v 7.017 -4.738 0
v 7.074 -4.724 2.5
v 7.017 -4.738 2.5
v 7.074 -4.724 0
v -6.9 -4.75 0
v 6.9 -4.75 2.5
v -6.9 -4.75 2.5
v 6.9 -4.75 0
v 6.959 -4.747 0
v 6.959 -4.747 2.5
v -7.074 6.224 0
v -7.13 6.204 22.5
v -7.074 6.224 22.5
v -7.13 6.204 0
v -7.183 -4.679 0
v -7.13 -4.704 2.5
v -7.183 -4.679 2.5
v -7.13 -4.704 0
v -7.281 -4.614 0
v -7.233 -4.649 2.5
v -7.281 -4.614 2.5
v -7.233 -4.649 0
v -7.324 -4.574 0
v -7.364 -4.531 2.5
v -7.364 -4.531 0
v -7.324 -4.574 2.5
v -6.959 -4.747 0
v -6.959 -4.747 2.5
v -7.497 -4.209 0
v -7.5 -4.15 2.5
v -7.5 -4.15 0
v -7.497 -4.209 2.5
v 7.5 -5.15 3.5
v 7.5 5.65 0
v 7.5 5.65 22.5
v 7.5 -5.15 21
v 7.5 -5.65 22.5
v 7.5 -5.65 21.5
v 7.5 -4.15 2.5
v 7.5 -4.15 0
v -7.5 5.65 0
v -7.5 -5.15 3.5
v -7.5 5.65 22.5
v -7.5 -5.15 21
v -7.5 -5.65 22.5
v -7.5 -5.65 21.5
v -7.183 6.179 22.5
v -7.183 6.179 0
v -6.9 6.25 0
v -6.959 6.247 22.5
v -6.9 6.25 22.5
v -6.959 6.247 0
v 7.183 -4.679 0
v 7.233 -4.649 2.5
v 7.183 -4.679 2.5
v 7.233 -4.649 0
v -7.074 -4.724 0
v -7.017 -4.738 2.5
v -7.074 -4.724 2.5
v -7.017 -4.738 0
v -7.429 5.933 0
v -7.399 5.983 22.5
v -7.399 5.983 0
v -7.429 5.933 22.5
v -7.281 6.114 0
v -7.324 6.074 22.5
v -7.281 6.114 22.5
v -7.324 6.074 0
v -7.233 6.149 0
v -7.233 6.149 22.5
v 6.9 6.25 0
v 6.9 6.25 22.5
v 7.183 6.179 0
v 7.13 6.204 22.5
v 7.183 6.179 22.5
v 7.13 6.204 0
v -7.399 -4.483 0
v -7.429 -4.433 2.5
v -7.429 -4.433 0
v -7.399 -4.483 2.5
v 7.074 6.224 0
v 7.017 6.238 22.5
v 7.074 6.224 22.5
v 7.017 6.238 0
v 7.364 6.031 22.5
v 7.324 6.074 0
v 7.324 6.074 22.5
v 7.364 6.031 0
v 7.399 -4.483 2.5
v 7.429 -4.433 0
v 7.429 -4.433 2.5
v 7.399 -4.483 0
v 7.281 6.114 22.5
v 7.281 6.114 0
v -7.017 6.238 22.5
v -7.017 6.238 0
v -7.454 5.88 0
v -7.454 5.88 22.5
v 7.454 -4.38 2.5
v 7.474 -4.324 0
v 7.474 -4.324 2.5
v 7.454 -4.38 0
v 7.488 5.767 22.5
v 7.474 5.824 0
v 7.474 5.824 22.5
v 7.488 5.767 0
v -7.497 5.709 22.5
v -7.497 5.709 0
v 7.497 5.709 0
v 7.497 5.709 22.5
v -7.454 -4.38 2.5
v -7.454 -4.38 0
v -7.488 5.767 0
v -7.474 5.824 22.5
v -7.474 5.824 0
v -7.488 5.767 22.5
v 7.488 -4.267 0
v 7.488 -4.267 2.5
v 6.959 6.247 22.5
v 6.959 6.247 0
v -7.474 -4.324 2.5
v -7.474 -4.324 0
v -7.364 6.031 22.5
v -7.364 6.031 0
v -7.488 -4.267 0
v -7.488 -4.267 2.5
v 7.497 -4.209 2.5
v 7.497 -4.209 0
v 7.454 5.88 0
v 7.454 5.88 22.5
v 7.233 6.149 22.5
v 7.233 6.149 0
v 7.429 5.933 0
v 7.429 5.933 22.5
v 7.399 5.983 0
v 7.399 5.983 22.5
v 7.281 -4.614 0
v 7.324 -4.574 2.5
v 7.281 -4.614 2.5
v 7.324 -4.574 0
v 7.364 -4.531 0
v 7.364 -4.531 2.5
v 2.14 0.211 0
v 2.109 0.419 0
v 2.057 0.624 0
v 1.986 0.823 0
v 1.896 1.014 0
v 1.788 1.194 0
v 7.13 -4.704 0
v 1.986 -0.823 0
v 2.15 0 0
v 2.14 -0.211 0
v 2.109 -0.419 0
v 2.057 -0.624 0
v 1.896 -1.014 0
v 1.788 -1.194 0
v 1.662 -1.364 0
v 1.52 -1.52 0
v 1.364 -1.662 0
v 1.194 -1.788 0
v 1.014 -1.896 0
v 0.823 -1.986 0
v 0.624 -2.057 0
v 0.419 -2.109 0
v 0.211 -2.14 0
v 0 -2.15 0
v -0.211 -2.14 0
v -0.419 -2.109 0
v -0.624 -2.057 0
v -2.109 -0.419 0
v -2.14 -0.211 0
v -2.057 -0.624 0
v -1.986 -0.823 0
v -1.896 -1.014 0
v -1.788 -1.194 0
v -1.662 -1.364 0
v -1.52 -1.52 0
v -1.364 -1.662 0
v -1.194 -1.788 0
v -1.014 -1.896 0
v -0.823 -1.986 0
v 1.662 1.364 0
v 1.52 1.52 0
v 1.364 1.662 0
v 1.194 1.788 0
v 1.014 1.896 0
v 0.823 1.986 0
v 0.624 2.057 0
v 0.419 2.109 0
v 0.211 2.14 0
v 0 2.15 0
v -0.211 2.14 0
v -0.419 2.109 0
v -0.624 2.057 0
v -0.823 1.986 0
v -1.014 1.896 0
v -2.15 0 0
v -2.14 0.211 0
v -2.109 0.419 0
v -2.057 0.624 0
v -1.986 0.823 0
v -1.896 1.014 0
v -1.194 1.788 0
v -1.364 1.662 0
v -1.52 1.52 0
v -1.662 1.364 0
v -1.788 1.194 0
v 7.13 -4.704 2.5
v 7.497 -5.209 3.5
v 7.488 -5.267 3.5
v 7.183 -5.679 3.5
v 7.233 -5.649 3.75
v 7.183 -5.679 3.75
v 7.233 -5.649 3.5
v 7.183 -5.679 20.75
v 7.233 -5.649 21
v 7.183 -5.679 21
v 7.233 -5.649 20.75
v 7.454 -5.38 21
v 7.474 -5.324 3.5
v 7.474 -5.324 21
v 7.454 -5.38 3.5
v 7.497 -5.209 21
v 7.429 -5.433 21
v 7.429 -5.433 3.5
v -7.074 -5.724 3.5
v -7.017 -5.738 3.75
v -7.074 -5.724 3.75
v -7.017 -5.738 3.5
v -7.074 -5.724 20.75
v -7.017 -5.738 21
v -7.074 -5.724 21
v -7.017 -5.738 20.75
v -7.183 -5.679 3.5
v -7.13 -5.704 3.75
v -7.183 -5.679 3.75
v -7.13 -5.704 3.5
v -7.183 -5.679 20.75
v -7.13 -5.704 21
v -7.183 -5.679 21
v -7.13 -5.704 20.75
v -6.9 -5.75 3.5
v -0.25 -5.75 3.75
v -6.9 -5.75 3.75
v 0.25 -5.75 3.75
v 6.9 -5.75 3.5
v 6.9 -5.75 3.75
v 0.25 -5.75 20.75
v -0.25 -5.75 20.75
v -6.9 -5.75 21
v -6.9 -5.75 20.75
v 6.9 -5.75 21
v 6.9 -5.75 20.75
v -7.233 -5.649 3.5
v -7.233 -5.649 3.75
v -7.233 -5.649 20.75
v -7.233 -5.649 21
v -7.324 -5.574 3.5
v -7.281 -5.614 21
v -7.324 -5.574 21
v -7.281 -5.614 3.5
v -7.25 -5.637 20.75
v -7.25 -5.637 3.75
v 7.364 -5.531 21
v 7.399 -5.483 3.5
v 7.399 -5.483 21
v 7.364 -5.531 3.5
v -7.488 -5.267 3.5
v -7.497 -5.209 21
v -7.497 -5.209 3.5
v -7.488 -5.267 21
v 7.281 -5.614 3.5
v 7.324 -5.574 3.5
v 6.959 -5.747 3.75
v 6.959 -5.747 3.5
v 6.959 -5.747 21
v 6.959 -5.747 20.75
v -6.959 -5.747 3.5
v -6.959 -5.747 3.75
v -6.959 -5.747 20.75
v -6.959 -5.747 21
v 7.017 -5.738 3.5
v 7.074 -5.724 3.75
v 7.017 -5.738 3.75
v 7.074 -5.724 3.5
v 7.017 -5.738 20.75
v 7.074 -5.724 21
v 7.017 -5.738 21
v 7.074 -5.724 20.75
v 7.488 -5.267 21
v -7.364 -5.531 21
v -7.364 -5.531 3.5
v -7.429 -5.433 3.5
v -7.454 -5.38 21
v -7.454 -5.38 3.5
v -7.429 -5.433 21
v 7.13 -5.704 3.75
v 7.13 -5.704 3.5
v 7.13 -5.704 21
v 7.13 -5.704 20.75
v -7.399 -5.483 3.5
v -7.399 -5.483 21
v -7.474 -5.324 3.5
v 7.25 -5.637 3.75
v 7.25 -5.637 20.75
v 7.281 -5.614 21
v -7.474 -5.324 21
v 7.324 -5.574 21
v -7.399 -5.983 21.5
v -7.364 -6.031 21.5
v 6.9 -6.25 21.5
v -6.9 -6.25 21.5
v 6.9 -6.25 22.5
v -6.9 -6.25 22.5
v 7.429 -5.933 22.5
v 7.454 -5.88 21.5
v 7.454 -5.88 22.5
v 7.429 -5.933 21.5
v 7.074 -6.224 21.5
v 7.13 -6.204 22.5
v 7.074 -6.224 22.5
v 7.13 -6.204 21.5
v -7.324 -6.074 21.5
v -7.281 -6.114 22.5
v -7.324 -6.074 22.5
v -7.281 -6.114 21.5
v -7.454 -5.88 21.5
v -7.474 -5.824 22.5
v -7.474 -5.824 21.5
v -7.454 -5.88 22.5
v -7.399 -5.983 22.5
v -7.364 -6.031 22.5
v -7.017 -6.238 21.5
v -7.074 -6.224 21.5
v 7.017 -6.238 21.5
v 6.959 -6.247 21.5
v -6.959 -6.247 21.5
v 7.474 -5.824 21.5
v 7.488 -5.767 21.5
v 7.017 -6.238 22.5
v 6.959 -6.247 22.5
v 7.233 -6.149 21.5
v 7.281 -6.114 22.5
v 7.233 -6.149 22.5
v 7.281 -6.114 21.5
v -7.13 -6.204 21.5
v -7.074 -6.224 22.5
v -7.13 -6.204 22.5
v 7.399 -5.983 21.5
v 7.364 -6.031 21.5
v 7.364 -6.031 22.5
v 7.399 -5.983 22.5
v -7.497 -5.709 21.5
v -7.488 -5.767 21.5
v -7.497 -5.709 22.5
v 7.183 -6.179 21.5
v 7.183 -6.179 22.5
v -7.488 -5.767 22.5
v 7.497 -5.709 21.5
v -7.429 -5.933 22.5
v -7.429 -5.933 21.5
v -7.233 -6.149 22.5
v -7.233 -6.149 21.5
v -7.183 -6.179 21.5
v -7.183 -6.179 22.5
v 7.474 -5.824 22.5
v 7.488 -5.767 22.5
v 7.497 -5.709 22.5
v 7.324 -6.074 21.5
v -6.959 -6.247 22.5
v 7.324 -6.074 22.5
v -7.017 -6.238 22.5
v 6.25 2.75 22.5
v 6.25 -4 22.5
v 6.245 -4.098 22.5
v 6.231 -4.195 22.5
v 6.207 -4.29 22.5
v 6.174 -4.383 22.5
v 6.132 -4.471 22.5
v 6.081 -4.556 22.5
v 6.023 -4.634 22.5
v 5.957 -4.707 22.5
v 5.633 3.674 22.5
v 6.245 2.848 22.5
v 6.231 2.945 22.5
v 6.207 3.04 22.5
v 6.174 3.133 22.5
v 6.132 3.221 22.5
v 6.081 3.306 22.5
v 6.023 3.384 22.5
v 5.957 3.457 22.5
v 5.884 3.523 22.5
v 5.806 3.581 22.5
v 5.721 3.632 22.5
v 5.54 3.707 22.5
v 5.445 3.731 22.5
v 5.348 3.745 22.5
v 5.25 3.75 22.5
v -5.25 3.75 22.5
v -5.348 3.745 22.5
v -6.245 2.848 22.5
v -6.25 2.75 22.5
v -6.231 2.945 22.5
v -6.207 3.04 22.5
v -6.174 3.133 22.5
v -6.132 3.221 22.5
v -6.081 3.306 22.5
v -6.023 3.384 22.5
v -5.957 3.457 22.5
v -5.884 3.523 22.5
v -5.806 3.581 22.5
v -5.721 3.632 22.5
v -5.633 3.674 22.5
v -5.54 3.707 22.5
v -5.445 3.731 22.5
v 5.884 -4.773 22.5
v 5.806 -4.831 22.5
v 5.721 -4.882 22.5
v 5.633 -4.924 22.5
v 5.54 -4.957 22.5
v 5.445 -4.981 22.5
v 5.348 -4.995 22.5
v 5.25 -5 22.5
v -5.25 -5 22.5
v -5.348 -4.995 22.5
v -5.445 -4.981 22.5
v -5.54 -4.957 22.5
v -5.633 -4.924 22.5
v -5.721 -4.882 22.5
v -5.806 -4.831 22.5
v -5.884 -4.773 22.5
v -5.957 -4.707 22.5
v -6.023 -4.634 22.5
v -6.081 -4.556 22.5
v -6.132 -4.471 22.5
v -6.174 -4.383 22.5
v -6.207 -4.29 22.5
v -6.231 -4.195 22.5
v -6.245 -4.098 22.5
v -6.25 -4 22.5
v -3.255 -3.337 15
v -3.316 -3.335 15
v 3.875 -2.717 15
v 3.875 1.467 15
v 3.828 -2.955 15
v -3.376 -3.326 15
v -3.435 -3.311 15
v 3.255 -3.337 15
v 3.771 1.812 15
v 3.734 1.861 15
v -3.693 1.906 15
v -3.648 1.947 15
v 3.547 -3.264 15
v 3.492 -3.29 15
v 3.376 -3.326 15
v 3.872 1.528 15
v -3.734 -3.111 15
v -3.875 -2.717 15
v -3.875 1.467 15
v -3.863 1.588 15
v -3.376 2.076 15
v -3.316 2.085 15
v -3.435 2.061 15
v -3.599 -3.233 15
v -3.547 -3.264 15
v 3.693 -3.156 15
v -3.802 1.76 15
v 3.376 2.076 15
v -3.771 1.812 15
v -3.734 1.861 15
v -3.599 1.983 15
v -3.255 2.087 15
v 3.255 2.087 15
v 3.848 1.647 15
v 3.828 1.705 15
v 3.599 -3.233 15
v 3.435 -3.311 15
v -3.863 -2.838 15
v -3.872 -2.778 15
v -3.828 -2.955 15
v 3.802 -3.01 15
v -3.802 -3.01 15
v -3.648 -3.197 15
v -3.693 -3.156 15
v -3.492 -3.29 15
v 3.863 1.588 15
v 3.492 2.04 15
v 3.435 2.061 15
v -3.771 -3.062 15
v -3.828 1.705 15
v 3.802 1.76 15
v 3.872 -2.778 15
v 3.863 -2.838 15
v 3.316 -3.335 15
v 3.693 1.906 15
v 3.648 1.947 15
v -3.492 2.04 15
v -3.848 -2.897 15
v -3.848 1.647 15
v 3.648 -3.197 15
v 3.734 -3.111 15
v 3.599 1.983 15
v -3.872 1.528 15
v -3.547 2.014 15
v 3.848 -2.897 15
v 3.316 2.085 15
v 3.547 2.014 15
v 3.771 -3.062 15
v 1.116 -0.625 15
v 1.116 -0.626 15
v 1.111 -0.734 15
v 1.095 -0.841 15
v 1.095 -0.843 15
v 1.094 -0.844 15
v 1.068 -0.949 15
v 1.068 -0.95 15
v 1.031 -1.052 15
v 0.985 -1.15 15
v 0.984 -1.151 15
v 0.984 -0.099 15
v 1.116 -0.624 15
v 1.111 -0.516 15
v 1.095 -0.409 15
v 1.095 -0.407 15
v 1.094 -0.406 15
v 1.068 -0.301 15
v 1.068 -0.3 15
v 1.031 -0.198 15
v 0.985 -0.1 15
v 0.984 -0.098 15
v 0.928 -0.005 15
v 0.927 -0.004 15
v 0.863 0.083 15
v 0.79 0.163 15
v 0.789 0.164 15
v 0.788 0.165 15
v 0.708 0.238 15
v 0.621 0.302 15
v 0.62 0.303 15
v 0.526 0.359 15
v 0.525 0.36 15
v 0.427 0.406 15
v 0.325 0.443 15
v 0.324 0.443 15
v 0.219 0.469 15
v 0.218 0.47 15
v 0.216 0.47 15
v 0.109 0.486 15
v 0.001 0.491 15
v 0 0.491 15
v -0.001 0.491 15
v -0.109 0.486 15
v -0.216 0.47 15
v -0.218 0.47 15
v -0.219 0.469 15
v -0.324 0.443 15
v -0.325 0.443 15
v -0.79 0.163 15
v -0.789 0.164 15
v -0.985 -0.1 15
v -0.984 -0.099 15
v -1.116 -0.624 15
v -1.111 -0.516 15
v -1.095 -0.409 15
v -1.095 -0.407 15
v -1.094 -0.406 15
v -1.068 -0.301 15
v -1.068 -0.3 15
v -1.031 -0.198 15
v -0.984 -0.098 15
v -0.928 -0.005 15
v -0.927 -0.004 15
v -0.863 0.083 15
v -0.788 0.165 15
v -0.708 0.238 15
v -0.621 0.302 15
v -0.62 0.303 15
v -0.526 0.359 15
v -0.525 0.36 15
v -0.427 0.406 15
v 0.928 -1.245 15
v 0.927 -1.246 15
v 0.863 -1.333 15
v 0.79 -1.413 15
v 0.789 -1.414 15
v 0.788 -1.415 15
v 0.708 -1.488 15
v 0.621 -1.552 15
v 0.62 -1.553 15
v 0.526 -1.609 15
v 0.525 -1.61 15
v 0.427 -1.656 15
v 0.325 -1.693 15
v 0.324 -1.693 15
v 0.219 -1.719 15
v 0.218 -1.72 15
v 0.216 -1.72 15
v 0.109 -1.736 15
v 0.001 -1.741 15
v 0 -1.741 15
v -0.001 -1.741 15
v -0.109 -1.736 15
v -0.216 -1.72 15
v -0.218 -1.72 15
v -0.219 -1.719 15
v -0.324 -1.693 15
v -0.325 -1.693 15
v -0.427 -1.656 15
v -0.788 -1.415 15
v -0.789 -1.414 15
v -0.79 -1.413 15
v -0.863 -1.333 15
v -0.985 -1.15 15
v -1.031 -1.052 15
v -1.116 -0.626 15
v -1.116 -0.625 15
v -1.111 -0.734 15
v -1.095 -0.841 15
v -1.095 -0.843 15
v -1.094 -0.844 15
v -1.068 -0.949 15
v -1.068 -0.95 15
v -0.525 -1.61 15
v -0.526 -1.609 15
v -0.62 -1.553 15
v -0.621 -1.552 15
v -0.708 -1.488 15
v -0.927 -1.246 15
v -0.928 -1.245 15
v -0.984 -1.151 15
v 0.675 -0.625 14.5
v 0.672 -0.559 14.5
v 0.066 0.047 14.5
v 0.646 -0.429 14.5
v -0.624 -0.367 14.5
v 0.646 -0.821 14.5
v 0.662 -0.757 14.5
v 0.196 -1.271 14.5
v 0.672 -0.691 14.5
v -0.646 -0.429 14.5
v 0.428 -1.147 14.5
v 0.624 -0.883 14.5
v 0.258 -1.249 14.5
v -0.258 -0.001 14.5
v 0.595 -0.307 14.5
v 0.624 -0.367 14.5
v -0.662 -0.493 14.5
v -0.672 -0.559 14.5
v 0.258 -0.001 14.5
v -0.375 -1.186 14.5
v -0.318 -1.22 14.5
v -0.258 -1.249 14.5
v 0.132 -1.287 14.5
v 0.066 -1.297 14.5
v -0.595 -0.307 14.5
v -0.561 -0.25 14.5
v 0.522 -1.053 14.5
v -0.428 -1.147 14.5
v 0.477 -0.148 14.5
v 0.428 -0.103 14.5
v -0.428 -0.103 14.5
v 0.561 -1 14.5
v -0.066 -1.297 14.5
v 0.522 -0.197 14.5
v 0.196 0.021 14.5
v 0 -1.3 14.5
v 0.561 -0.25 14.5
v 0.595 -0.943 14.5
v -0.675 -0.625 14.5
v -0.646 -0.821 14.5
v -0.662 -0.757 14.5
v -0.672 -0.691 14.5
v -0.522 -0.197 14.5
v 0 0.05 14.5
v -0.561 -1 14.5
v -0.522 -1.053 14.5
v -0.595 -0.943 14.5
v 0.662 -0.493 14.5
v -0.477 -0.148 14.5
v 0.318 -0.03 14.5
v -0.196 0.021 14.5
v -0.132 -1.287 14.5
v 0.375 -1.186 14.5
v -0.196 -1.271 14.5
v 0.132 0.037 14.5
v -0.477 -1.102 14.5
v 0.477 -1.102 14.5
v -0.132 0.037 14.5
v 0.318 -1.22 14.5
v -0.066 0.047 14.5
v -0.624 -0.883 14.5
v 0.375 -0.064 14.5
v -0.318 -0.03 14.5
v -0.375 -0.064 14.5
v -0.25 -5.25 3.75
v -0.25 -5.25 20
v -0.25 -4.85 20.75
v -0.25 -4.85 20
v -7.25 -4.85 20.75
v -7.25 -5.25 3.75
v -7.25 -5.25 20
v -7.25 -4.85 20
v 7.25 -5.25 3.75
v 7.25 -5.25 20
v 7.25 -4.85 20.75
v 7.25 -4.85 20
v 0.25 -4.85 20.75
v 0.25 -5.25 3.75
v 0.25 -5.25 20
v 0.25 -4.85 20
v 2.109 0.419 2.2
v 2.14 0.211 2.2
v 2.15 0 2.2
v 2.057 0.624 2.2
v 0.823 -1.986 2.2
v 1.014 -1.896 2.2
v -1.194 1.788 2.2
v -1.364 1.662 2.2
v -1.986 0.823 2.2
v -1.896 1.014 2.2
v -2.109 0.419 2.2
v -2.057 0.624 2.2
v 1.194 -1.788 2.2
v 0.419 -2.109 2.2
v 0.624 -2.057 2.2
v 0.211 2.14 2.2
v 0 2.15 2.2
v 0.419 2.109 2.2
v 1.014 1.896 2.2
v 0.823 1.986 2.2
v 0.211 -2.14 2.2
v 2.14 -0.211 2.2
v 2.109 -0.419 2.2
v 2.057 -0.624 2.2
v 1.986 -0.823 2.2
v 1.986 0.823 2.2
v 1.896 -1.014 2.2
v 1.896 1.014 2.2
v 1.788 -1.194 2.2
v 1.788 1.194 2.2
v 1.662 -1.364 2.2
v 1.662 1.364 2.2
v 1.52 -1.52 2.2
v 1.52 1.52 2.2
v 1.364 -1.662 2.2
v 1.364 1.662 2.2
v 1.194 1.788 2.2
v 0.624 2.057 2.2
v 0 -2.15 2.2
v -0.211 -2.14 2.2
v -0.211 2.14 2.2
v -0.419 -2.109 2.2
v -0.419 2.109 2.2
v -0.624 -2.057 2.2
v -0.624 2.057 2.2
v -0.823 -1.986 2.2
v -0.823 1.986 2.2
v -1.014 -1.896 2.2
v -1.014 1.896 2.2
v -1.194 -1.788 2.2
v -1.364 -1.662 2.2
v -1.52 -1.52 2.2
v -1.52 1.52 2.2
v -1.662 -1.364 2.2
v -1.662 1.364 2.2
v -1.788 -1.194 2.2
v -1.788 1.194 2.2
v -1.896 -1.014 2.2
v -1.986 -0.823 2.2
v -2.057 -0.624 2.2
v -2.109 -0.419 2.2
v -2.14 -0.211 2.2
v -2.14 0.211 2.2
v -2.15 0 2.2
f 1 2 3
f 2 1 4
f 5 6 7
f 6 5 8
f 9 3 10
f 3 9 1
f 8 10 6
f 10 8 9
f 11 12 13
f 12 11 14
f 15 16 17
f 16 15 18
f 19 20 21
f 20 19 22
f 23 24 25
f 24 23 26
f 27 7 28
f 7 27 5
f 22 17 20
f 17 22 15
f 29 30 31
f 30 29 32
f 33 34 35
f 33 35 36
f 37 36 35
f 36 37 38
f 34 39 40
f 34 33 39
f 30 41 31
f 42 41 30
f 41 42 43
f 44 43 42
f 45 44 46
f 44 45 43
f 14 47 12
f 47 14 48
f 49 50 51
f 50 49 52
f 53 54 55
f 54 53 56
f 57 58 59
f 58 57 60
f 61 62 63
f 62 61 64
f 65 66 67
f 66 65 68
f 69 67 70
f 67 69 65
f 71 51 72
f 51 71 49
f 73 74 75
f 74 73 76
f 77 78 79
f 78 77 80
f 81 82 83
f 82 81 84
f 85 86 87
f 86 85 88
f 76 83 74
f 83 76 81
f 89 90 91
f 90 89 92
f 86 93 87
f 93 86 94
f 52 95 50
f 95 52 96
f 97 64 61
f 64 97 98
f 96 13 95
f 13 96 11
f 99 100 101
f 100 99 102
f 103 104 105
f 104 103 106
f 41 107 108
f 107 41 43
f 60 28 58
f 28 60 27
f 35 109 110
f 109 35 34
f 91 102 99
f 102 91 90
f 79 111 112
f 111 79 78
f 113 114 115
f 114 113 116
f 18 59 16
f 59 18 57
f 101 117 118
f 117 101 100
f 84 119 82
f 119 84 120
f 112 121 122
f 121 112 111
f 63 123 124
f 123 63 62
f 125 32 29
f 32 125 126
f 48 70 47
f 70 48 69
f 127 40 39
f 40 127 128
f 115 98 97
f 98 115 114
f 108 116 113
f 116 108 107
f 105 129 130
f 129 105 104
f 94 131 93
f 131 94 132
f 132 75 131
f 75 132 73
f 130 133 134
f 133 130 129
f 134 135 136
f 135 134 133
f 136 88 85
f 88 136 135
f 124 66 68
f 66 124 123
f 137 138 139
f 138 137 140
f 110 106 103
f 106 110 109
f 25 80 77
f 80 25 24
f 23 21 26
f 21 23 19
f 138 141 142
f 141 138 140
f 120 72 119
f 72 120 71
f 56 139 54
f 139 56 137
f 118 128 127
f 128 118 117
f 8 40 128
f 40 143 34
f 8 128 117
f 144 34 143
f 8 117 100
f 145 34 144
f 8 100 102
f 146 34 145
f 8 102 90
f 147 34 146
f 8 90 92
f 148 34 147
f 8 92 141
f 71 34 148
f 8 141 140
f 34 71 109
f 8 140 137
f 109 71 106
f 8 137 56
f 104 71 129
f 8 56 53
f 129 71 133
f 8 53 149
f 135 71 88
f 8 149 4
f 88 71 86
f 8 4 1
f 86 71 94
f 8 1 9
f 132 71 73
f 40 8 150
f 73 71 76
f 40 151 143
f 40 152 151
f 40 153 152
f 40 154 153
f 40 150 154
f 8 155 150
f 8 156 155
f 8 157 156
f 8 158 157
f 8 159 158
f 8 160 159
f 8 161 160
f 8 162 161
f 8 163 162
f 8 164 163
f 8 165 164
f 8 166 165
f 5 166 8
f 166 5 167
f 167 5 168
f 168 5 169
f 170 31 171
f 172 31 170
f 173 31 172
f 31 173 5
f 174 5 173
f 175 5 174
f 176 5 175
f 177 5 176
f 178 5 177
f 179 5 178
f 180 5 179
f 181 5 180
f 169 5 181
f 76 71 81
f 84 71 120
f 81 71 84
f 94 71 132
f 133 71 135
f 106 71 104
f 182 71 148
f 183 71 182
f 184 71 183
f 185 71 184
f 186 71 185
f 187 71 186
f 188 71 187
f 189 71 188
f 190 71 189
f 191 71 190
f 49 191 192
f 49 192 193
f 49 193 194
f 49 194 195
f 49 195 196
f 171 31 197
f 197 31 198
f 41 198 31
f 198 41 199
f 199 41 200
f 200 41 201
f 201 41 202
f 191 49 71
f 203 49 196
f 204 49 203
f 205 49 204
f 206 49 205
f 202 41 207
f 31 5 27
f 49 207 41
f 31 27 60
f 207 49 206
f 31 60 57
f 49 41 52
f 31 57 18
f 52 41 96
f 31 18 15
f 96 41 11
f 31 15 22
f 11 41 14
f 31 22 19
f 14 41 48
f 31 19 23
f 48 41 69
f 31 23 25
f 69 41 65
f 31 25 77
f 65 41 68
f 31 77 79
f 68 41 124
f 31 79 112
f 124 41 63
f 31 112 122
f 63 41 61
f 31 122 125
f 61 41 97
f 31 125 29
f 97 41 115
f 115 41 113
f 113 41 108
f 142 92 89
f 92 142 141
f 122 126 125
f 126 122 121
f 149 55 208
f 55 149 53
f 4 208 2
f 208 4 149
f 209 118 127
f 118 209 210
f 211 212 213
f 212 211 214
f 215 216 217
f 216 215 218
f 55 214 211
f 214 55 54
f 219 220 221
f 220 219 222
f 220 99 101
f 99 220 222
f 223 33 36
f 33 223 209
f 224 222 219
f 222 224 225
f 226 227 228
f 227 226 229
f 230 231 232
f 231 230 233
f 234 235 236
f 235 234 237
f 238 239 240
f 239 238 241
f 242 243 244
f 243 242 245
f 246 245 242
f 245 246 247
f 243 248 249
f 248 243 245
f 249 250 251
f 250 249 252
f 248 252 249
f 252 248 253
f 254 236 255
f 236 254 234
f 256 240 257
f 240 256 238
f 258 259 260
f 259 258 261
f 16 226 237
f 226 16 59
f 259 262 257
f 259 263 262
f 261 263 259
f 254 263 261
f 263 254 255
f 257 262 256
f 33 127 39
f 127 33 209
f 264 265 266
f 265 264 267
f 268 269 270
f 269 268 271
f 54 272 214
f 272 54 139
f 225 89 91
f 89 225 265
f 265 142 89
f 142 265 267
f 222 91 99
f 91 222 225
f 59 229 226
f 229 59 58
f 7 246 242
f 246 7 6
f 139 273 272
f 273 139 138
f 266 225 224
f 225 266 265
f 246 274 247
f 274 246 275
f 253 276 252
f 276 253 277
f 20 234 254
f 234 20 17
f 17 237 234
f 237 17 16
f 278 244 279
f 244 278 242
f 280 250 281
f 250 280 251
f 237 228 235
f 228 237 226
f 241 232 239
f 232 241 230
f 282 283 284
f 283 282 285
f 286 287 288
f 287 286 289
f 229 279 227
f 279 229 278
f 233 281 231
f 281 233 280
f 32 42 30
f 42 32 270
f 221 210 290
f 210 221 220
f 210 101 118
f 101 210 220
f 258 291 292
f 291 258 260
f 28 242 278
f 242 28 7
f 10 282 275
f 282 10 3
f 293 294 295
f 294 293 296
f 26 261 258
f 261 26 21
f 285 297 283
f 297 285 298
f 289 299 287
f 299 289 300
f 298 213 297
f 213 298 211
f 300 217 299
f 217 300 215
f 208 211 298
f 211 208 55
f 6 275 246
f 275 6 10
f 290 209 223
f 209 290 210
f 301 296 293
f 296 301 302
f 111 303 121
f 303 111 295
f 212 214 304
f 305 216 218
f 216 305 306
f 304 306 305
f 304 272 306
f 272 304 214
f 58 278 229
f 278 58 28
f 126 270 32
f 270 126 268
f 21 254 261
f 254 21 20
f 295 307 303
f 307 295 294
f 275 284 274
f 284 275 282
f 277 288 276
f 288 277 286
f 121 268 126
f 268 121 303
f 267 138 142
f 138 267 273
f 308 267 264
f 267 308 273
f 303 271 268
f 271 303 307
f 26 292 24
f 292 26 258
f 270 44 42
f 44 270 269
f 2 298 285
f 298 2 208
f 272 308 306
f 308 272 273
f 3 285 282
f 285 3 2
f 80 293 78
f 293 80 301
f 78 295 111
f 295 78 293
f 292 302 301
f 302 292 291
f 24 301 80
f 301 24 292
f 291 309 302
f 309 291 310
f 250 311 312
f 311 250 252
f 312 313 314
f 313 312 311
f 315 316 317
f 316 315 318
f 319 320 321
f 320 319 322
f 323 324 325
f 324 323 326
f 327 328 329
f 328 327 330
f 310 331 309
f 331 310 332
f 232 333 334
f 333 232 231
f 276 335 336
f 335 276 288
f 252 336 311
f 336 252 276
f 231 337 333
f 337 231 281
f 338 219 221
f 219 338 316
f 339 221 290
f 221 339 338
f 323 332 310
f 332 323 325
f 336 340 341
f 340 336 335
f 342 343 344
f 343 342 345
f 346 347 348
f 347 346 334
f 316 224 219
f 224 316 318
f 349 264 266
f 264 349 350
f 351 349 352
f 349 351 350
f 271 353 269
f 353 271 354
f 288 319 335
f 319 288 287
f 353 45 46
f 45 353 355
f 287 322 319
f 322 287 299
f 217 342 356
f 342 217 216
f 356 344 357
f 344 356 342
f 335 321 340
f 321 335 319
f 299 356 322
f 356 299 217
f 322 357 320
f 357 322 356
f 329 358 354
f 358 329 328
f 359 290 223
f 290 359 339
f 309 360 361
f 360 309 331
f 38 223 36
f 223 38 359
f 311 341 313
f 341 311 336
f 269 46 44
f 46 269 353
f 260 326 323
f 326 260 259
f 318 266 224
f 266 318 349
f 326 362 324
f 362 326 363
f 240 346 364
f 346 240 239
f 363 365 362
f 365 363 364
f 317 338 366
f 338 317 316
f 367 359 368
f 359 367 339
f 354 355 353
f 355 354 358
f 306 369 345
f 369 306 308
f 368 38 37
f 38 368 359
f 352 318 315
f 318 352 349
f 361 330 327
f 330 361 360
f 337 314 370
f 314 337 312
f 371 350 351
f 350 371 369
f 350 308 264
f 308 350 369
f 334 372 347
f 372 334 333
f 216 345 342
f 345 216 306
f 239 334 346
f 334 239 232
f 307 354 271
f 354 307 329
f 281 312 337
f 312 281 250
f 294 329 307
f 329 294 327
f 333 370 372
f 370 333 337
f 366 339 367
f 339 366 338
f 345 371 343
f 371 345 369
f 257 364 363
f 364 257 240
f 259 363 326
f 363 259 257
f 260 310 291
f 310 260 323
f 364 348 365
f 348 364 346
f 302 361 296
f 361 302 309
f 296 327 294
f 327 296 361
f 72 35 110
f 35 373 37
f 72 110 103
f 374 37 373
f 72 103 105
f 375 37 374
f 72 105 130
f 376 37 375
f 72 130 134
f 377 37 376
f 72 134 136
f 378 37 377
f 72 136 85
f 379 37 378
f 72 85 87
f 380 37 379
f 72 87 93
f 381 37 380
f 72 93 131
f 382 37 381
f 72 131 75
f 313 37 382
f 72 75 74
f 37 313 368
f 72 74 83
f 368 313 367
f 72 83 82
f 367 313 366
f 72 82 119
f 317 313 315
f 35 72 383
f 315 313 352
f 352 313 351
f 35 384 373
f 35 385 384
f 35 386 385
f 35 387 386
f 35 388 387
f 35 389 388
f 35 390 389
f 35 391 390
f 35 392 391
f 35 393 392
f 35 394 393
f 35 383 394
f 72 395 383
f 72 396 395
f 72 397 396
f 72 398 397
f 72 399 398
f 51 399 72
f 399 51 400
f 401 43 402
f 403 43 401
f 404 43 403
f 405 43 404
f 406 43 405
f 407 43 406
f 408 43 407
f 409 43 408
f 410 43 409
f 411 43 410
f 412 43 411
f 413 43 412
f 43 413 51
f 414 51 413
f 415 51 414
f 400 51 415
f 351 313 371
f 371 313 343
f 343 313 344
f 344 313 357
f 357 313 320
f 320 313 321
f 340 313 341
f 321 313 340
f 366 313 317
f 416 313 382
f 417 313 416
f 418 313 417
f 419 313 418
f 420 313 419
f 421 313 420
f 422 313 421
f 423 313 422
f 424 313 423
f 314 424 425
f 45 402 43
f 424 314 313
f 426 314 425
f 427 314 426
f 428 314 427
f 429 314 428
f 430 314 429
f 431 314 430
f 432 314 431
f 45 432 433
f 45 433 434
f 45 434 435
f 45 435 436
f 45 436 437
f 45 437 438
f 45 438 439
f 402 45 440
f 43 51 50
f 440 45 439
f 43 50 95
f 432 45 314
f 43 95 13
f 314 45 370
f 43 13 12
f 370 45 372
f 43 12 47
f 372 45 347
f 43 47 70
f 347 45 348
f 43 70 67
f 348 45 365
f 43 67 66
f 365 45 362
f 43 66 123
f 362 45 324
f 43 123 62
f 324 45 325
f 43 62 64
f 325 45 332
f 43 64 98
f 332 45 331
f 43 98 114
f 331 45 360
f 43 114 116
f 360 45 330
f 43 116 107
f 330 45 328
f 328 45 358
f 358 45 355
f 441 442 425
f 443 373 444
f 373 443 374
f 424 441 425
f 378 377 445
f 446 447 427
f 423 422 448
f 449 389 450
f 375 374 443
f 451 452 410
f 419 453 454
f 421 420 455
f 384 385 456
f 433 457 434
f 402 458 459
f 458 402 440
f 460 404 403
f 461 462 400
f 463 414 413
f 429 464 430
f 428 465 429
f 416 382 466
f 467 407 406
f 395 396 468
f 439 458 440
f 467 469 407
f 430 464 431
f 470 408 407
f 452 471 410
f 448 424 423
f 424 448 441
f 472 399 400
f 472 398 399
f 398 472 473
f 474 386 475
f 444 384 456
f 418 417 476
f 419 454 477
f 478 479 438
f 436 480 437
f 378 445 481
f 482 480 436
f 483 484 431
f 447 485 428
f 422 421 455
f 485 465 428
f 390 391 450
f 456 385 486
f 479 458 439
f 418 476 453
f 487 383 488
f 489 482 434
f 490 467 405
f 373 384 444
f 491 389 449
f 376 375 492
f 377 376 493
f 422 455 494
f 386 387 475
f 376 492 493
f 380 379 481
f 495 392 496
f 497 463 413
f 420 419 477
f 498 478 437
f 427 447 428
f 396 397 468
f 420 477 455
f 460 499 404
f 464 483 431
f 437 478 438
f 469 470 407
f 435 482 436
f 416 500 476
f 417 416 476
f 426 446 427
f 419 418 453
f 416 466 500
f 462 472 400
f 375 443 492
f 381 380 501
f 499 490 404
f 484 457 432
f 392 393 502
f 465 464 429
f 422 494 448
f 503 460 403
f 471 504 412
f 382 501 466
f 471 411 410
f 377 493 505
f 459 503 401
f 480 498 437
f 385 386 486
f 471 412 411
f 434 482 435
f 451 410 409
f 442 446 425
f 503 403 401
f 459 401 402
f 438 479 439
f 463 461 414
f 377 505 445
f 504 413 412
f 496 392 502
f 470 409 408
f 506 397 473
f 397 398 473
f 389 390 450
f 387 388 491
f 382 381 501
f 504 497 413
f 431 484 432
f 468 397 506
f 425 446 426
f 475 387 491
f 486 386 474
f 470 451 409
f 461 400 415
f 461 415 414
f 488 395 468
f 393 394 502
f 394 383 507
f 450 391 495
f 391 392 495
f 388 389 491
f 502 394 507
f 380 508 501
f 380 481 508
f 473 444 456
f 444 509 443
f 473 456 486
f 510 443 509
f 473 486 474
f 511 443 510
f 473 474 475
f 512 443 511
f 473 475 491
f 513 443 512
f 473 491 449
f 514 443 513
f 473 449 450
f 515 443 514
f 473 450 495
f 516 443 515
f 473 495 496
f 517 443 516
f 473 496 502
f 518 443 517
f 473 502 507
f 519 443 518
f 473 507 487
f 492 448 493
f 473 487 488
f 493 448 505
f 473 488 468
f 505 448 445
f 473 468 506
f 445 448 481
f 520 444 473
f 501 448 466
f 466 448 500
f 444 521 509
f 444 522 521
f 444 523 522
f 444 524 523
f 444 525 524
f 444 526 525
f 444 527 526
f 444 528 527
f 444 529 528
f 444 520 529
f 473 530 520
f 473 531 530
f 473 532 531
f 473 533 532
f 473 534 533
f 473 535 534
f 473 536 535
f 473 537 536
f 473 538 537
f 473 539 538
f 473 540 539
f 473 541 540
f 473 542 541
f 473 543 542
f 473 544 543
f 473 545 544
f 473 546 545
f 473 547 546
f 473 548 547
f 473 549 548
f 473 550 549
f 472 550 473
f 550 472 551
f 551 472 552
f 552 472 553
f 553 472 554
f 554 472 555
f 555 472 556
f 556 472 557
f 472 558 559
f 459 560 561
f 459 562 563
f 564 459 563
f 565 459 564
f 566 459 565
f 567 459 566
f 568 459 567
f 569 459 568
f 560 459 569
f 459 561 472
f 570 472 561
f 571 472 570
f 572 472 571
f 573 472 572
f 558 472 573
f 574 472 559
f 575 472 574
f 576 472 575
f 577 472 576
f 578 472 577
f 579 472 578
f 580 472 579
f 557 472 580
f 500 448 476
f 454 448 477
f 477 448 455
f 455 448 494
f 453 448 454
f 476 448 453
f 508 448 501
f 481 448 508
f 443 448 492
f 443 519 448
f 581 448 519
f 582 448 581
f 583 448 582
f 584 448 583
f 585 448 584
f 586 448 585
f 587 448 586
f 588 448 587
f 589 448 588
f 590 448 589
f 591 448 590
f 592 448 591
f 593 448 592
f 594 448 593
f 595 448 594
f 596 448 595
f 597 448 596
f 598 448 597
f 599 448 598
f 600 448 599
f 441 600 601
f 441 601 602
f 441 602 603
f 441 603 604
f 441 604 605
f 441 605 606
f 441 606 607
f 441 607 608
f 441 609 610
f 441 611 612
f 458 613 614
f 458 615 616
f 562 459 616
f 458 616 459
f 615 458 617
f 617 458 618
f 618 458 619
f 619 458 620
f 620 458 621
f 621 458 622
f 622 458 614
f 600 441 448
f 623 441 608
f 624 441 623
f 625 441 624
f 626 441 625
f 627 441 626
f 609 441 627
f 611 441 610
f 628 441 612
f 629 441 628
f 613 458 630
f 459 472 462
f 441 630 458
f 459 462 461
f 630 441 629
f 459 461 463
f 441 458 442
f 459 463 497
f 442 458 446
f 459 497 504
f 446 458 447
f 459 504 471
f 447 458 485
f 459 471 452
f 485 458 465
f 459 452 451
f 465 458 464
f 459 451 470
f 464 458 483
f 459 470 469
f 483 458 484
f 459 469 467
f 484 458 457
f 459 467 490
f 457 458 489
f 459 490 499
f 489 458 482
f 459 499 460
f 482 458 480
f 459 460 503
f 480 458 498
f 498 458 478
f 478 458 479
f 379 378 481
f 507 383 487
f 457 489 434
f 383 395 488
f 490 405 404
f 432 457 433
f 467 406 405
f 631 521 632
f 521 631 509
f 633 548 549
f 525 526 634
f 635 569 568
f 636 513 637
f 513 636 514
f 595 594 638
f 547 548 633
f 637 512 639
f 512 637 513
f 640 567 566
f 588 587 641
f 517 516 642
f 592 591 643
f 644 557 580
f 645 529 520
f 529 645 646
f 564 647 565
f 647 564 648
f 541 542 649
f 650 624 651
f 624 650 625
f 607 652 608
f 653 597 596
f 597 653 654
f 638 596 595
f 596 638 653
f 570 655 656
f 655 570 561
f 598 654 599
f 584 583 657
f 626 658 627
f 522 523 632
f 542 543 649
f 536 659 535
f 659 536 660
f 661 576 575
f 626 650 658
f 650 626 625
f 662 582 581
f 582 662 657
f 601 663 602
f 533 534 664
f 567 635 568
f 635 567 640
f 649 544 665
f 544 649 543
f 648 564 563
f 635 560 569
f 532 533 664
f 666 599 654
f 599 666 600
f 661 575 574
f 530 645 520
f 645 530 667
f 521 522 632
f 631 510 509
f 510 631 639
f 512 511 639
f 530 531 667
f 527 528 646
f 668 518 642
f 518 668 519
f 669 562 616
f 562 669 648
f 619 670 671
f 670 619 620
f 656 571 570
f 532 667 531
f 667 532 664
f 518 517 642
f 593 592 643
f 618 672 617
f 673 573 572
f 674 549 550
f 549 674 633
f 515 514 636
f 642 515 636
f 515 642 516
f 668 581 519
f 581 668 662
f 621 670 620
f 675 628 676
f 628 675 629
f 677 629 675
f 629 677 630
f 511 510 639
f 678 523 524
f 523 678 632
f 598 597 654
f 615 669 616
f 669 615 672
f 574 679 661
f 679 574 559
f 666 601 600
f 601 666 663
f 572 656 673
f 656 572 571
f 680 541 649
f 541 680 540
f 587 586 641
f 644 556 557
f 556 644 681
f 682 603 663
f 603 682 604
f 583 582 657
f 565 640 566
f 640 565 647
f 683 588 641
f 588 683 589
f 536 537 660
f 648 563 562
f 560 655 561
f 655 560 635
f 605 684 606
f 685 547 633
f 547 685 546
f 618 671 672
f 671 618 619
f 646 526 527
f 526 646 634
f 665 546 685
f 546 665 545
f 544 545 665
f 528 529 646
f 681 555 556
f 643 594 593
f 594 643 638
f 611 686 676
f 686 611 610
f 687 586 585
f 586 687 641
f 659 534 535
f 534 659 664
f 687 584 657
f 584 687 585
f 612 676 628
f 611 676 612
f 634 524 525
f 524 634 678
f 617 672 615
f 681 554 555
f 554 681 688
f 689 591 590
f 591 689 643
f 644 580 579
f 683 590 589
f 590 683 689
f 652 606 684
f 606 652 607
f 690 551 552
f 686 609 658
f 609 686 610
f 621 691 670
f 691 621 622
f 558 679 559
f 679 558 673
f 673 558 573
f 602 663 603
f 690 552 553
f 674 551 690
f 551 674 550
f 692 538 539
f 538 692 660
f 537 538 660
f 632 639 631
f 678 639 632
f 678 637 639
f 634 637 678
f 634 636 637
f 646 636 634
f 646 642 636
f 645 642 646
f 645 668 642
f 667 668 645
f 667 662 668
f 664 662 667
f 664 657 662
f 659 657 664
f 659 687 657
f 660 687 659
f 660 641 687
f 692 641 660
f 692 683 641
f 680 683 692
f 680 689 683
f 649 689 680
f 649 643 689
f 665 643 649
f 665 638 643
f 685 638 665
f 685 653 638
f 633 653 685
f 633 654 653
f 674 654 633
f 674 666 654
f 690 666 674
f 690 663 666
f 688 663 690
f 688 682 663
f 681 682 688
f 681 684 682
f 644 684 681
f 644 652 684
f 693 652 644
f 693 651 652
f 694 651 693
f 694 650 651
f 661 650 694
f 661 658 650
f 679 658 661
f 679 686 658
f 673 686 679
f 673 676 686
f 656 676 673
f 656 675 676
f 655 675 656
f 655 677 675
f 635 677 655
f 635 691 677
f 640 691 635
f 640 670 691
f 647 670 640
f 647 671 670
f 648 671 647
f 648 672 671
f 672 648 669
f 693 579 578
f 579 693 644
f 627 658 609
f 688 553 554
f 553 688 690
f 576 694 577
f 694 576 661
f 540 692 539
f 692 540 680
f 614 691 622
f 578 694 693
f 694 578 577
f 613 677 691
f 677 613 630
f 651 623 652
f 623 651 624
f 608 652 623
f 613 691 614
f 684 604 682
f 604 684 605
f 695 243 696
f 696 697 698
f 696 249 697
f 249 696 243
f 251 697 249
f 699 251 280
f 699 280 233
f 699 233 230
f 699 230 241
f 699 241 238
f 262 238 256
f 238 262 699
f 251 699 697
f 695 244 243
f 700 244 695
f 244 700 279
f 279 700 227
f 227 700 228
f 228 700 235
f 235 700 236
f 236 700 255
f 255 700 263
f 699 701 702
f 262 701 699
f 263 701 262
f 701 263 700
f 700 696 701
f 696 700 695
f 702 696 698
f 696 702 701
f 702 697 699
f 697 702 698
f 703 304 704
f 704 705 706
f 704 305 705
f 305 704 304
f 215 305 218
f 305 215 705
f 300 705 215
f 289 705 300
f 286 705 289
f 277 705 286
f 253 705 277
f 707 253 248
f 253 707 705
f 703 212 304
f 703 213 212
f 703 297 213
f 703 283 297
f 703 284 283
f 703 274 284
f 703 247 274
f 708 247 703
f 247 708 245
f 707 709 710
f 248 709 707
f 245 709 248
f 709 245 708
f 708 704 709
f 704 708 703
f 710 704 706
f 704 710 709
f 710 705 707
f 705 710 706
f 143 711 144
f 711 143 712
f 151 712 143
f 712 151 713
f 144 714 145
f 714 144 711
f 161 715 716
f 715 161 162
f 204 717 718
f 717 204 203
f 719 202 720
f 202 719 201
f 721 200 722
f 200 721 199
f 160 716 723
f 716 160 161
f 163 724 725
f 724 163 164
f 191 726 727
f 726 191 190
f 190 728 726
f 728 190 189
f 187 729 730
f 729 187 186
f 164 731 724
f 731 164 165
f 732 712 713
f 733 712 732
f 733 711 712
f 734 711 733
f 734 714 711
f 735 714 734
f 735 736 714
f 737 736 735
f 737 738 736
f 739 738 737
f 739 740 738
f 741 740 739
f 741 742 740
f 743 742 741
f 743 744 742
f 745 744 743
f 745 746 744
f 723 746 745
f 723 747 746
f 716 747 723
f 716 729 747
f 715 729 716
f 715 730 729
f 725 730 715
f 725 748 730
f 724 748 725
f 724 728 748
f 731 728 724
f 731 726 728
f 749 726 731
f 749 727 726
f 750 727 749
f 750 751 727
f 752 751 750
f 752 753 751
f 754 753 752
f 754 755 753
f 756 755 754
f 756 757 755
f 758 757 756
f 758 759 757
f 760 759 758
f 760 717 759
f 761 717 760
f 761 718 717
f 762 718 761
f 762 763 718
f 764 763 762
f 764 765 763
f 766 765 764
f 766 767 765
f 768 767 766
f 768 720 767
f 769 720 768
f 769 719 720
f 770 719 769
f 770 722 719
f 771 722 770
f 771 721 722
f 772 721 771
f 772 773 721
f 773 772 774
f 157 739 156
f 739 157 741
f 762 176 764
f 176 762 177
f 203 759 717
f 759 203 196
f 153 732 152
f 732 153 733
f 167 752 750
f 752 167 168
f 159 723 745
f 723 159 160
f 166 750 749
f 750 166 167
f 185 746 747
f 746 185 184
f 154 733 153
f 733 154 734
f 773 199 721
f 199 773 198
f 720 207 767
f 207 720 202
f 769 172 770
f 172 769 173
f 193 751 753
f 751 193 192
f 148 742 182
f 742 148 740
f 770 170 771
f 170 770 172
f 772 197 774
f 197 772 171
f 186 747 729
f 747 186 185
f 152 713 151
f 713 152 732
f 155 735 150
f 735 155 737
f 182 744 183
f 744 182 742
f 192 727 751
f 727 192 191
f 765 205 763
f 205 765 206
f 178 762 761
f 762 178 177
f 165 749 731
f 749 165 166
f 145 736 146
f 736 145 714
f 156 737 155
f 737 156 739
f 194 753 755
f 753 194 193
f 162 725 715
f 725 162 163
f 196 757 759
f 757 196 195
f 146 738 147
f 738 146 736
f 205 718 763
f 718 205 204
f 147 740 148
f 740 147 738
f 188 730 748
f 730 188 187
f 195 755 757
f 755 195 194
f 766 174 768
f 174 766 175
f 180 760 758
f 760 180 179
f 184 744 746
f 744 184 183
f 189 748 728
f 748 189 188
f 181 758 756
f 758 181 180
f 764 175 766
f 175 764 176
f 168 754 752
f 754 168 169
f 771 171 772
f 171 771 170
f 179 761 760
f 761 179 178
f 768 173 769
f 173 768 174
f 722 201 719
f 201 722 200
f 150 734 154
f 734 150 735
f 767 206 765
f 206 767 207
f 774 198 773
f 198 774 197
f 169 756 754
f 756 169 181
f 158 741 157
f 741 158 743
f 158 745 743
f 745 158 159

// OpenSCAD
// laundry / utility_sink — a deep single-basin utility sink: a real sunken tub in the worktop
// of a base unit, with a door pair on the carcass face below it.
//
// It used to draw the basin as an outline groove with a tap ring beside it — a 0.4 mm line
// round a bowl that is the whole point of the piece. It is now a hollow, and a deeper one than
// the kitchen's: a utility tub is 30 cm deep where a kitchen bowl is 18, it fills its counter
// almost to the edges, and it has no drainer beside it. Those three things are what tell this
// from kitchen/sink.scad, along with being a 60x50 unit rather than an 80x60 one.
//
// No tap, for the reason washbasin.scad gives: at 1:40 it is a 1 mm pimple that snaps off and
// catches on whatever the piece is stored with. What it would stand on is drawn instead — the
// deck behind the tub is deeper than the lip in front of it, which is also what tells the
// token's back from its front.
//
// Width/Depth are the real-world footprint in cm: 60 x 50 is a common single-basin
// utility/laundry sink size. Height is the real height of the rim — worktop height, so it
// stands a little above the 85 cm machines beside it — shrunk by the plan scale like the
// footprint (see printed_h() in lib/common.scad).

include <../lib/common.scad>

Width  = 60;  // cm
Depth  = 50;  // cm
Height = 90;  // cm — the rim, at worktop height

// the printed height, mm: Height at the plan scale
Print_h = printed_h(Height);

// The worktop slab, real cm — the same as a kitchen run's, so a utility room and a kitchen
// read as one system (see kitchen/worktop.scad).
Slab = Unit_top;

Show_tub = true;
// The tub, in real cm. Deep, and set close to the edges: a utility sink is a bucket you can
// stand a mop in, not a bowl in a counter.
Tub_depth = 30;  // cm the tub dishes down
Tub_side  = 5;   // cm of deck kept each side of it ...
Tub_front = 5;   // ... in front, where the worktop's lip is ...
Tub_back  = 10;  // ... and behind, where the tap and the splashback go
Tub_r     = 1;   // printed mm, corner rounding of the tub
Tub_floor = 1.2; // printed mm of material kept under the deepest point, over a pocket

// The plughole: a countersunk hole in the flat floor of the tub, the same real 9 cm waste the
// kitchen sink gets — big enough to read as a hole from any angle.
Show_drain = true;
Drain_d    = 9;    // cm across at the tub floor
Drain_h    = 0.5;  // mm it sinks below that floor
Drain_cone = 0.6;  // its bottom as a fraction of its top — the slope catches the light

Show_fronts = true;
Front_cols  = 2;  // door fronts across the unit — a pair under the tub
// Magnet pockets in the bottom face (0 = none). One central pocket holds a piece this size
// down; it goes in the plinth, as everywhere in a run — 44 cm of it front to back is 11 mm at
// 1:40, comfortably wide enough for the 4 mm disc (see unit_plinth_d() and Magnet_* in
// lib/common.scad).
Magnets = 1;

// ---- the tub, sized to the counter it is cut into ---------------------------
function tub_w() = max(0, Width - 2 * Tub_side);
function tub_d() = max(0, Depth - Tub_front - Tub_back);
// Tub centre, real cm from the centre of the counter: forward enough to leave the tap deck
// behind it.
function tub_cy() = Depth / 2 - Tub_back - tub_d() / 2;
// How deep it really dishes, printed mm: what was asked for, less whatever the slab cannot
// give up — a magnet pocket, the floor over it and the plughole sunk into that.
function tub_dz() =
    max(0.5, min(rise(Tub_depth),
                 Print_h - magnet_pocket_h() - Tub_floor - (Show_drain ? Drain_h : 0)));
// Corner rounding, clamped so a small tub cannot be rounded away to nothing.
function tub_r() = max(0, min(Tub_r, min(cm(tub_w()), cm(tub_d())) / 2 - 0.05));
// The plughole: as wide as a real waste, or as wide as the flat floor can take with a wall
// left round it.
function drain_r() = min(cm(Drain_d) / 2,
                         Hollow_floor * min(cm(tub_w()), cm(tub_d())) / 2 - Symbol_stroke);

utility_sink();

module utility_sink() {
    if (Show_tub && tub_dz() < rise(Tub_depth) - 0.001)
        echo(str("WARNING: a ", Tub_depth, " cm tub does not fit in a ", Height,
                 " cm unit over ", magnet_pocket_h(), " mm of magnet pocket — sunk ",
                 rise_cm(tub_dz()), " cm instead (give it more: UTILITY_SINK_H)"));
    difference() {
        base_unit(Width, Depth, Print_h, Slab);
        if (Show_tub) {
            translate([0, cm(tub_cy()), 0])
                hollow(Print_h, tub_dz()) footprint_2d(tub_w(), tub_d(), tub_r());
            if (Show_drain && drain_r() > Symbol_stroke)
                drain();
        }
        if (Show_fronts)
            unit_fronts(Width, Depth,
                        unit_face_z0(Width, Depth, Print_h, Slab),
                        unit_face_z1(Width, Depth, Print_h, Slab),
                        Front_cols, 1, Slab);
        if (Magnets > 0)
            magnets(Width, unit_plinth_d(Width, Depth), Magnets);
    }
}

// The plughole: a countersunk hole in the middle of the tub's flat floor, sunk Drain_h below
// it and narrowing on the way down. The cut runs a hair above the floor so its rim comes out
// clean — the trick hollow() uses at the top face.
module drain() {
    r = drain_r();
    translate([0, cm(tub_cy()), Print_h - tub_dz() - Drain_h])
        cylinder(h = Drain_h + 0.01, r1 = r * Drain_cone, r2 = r);
}
